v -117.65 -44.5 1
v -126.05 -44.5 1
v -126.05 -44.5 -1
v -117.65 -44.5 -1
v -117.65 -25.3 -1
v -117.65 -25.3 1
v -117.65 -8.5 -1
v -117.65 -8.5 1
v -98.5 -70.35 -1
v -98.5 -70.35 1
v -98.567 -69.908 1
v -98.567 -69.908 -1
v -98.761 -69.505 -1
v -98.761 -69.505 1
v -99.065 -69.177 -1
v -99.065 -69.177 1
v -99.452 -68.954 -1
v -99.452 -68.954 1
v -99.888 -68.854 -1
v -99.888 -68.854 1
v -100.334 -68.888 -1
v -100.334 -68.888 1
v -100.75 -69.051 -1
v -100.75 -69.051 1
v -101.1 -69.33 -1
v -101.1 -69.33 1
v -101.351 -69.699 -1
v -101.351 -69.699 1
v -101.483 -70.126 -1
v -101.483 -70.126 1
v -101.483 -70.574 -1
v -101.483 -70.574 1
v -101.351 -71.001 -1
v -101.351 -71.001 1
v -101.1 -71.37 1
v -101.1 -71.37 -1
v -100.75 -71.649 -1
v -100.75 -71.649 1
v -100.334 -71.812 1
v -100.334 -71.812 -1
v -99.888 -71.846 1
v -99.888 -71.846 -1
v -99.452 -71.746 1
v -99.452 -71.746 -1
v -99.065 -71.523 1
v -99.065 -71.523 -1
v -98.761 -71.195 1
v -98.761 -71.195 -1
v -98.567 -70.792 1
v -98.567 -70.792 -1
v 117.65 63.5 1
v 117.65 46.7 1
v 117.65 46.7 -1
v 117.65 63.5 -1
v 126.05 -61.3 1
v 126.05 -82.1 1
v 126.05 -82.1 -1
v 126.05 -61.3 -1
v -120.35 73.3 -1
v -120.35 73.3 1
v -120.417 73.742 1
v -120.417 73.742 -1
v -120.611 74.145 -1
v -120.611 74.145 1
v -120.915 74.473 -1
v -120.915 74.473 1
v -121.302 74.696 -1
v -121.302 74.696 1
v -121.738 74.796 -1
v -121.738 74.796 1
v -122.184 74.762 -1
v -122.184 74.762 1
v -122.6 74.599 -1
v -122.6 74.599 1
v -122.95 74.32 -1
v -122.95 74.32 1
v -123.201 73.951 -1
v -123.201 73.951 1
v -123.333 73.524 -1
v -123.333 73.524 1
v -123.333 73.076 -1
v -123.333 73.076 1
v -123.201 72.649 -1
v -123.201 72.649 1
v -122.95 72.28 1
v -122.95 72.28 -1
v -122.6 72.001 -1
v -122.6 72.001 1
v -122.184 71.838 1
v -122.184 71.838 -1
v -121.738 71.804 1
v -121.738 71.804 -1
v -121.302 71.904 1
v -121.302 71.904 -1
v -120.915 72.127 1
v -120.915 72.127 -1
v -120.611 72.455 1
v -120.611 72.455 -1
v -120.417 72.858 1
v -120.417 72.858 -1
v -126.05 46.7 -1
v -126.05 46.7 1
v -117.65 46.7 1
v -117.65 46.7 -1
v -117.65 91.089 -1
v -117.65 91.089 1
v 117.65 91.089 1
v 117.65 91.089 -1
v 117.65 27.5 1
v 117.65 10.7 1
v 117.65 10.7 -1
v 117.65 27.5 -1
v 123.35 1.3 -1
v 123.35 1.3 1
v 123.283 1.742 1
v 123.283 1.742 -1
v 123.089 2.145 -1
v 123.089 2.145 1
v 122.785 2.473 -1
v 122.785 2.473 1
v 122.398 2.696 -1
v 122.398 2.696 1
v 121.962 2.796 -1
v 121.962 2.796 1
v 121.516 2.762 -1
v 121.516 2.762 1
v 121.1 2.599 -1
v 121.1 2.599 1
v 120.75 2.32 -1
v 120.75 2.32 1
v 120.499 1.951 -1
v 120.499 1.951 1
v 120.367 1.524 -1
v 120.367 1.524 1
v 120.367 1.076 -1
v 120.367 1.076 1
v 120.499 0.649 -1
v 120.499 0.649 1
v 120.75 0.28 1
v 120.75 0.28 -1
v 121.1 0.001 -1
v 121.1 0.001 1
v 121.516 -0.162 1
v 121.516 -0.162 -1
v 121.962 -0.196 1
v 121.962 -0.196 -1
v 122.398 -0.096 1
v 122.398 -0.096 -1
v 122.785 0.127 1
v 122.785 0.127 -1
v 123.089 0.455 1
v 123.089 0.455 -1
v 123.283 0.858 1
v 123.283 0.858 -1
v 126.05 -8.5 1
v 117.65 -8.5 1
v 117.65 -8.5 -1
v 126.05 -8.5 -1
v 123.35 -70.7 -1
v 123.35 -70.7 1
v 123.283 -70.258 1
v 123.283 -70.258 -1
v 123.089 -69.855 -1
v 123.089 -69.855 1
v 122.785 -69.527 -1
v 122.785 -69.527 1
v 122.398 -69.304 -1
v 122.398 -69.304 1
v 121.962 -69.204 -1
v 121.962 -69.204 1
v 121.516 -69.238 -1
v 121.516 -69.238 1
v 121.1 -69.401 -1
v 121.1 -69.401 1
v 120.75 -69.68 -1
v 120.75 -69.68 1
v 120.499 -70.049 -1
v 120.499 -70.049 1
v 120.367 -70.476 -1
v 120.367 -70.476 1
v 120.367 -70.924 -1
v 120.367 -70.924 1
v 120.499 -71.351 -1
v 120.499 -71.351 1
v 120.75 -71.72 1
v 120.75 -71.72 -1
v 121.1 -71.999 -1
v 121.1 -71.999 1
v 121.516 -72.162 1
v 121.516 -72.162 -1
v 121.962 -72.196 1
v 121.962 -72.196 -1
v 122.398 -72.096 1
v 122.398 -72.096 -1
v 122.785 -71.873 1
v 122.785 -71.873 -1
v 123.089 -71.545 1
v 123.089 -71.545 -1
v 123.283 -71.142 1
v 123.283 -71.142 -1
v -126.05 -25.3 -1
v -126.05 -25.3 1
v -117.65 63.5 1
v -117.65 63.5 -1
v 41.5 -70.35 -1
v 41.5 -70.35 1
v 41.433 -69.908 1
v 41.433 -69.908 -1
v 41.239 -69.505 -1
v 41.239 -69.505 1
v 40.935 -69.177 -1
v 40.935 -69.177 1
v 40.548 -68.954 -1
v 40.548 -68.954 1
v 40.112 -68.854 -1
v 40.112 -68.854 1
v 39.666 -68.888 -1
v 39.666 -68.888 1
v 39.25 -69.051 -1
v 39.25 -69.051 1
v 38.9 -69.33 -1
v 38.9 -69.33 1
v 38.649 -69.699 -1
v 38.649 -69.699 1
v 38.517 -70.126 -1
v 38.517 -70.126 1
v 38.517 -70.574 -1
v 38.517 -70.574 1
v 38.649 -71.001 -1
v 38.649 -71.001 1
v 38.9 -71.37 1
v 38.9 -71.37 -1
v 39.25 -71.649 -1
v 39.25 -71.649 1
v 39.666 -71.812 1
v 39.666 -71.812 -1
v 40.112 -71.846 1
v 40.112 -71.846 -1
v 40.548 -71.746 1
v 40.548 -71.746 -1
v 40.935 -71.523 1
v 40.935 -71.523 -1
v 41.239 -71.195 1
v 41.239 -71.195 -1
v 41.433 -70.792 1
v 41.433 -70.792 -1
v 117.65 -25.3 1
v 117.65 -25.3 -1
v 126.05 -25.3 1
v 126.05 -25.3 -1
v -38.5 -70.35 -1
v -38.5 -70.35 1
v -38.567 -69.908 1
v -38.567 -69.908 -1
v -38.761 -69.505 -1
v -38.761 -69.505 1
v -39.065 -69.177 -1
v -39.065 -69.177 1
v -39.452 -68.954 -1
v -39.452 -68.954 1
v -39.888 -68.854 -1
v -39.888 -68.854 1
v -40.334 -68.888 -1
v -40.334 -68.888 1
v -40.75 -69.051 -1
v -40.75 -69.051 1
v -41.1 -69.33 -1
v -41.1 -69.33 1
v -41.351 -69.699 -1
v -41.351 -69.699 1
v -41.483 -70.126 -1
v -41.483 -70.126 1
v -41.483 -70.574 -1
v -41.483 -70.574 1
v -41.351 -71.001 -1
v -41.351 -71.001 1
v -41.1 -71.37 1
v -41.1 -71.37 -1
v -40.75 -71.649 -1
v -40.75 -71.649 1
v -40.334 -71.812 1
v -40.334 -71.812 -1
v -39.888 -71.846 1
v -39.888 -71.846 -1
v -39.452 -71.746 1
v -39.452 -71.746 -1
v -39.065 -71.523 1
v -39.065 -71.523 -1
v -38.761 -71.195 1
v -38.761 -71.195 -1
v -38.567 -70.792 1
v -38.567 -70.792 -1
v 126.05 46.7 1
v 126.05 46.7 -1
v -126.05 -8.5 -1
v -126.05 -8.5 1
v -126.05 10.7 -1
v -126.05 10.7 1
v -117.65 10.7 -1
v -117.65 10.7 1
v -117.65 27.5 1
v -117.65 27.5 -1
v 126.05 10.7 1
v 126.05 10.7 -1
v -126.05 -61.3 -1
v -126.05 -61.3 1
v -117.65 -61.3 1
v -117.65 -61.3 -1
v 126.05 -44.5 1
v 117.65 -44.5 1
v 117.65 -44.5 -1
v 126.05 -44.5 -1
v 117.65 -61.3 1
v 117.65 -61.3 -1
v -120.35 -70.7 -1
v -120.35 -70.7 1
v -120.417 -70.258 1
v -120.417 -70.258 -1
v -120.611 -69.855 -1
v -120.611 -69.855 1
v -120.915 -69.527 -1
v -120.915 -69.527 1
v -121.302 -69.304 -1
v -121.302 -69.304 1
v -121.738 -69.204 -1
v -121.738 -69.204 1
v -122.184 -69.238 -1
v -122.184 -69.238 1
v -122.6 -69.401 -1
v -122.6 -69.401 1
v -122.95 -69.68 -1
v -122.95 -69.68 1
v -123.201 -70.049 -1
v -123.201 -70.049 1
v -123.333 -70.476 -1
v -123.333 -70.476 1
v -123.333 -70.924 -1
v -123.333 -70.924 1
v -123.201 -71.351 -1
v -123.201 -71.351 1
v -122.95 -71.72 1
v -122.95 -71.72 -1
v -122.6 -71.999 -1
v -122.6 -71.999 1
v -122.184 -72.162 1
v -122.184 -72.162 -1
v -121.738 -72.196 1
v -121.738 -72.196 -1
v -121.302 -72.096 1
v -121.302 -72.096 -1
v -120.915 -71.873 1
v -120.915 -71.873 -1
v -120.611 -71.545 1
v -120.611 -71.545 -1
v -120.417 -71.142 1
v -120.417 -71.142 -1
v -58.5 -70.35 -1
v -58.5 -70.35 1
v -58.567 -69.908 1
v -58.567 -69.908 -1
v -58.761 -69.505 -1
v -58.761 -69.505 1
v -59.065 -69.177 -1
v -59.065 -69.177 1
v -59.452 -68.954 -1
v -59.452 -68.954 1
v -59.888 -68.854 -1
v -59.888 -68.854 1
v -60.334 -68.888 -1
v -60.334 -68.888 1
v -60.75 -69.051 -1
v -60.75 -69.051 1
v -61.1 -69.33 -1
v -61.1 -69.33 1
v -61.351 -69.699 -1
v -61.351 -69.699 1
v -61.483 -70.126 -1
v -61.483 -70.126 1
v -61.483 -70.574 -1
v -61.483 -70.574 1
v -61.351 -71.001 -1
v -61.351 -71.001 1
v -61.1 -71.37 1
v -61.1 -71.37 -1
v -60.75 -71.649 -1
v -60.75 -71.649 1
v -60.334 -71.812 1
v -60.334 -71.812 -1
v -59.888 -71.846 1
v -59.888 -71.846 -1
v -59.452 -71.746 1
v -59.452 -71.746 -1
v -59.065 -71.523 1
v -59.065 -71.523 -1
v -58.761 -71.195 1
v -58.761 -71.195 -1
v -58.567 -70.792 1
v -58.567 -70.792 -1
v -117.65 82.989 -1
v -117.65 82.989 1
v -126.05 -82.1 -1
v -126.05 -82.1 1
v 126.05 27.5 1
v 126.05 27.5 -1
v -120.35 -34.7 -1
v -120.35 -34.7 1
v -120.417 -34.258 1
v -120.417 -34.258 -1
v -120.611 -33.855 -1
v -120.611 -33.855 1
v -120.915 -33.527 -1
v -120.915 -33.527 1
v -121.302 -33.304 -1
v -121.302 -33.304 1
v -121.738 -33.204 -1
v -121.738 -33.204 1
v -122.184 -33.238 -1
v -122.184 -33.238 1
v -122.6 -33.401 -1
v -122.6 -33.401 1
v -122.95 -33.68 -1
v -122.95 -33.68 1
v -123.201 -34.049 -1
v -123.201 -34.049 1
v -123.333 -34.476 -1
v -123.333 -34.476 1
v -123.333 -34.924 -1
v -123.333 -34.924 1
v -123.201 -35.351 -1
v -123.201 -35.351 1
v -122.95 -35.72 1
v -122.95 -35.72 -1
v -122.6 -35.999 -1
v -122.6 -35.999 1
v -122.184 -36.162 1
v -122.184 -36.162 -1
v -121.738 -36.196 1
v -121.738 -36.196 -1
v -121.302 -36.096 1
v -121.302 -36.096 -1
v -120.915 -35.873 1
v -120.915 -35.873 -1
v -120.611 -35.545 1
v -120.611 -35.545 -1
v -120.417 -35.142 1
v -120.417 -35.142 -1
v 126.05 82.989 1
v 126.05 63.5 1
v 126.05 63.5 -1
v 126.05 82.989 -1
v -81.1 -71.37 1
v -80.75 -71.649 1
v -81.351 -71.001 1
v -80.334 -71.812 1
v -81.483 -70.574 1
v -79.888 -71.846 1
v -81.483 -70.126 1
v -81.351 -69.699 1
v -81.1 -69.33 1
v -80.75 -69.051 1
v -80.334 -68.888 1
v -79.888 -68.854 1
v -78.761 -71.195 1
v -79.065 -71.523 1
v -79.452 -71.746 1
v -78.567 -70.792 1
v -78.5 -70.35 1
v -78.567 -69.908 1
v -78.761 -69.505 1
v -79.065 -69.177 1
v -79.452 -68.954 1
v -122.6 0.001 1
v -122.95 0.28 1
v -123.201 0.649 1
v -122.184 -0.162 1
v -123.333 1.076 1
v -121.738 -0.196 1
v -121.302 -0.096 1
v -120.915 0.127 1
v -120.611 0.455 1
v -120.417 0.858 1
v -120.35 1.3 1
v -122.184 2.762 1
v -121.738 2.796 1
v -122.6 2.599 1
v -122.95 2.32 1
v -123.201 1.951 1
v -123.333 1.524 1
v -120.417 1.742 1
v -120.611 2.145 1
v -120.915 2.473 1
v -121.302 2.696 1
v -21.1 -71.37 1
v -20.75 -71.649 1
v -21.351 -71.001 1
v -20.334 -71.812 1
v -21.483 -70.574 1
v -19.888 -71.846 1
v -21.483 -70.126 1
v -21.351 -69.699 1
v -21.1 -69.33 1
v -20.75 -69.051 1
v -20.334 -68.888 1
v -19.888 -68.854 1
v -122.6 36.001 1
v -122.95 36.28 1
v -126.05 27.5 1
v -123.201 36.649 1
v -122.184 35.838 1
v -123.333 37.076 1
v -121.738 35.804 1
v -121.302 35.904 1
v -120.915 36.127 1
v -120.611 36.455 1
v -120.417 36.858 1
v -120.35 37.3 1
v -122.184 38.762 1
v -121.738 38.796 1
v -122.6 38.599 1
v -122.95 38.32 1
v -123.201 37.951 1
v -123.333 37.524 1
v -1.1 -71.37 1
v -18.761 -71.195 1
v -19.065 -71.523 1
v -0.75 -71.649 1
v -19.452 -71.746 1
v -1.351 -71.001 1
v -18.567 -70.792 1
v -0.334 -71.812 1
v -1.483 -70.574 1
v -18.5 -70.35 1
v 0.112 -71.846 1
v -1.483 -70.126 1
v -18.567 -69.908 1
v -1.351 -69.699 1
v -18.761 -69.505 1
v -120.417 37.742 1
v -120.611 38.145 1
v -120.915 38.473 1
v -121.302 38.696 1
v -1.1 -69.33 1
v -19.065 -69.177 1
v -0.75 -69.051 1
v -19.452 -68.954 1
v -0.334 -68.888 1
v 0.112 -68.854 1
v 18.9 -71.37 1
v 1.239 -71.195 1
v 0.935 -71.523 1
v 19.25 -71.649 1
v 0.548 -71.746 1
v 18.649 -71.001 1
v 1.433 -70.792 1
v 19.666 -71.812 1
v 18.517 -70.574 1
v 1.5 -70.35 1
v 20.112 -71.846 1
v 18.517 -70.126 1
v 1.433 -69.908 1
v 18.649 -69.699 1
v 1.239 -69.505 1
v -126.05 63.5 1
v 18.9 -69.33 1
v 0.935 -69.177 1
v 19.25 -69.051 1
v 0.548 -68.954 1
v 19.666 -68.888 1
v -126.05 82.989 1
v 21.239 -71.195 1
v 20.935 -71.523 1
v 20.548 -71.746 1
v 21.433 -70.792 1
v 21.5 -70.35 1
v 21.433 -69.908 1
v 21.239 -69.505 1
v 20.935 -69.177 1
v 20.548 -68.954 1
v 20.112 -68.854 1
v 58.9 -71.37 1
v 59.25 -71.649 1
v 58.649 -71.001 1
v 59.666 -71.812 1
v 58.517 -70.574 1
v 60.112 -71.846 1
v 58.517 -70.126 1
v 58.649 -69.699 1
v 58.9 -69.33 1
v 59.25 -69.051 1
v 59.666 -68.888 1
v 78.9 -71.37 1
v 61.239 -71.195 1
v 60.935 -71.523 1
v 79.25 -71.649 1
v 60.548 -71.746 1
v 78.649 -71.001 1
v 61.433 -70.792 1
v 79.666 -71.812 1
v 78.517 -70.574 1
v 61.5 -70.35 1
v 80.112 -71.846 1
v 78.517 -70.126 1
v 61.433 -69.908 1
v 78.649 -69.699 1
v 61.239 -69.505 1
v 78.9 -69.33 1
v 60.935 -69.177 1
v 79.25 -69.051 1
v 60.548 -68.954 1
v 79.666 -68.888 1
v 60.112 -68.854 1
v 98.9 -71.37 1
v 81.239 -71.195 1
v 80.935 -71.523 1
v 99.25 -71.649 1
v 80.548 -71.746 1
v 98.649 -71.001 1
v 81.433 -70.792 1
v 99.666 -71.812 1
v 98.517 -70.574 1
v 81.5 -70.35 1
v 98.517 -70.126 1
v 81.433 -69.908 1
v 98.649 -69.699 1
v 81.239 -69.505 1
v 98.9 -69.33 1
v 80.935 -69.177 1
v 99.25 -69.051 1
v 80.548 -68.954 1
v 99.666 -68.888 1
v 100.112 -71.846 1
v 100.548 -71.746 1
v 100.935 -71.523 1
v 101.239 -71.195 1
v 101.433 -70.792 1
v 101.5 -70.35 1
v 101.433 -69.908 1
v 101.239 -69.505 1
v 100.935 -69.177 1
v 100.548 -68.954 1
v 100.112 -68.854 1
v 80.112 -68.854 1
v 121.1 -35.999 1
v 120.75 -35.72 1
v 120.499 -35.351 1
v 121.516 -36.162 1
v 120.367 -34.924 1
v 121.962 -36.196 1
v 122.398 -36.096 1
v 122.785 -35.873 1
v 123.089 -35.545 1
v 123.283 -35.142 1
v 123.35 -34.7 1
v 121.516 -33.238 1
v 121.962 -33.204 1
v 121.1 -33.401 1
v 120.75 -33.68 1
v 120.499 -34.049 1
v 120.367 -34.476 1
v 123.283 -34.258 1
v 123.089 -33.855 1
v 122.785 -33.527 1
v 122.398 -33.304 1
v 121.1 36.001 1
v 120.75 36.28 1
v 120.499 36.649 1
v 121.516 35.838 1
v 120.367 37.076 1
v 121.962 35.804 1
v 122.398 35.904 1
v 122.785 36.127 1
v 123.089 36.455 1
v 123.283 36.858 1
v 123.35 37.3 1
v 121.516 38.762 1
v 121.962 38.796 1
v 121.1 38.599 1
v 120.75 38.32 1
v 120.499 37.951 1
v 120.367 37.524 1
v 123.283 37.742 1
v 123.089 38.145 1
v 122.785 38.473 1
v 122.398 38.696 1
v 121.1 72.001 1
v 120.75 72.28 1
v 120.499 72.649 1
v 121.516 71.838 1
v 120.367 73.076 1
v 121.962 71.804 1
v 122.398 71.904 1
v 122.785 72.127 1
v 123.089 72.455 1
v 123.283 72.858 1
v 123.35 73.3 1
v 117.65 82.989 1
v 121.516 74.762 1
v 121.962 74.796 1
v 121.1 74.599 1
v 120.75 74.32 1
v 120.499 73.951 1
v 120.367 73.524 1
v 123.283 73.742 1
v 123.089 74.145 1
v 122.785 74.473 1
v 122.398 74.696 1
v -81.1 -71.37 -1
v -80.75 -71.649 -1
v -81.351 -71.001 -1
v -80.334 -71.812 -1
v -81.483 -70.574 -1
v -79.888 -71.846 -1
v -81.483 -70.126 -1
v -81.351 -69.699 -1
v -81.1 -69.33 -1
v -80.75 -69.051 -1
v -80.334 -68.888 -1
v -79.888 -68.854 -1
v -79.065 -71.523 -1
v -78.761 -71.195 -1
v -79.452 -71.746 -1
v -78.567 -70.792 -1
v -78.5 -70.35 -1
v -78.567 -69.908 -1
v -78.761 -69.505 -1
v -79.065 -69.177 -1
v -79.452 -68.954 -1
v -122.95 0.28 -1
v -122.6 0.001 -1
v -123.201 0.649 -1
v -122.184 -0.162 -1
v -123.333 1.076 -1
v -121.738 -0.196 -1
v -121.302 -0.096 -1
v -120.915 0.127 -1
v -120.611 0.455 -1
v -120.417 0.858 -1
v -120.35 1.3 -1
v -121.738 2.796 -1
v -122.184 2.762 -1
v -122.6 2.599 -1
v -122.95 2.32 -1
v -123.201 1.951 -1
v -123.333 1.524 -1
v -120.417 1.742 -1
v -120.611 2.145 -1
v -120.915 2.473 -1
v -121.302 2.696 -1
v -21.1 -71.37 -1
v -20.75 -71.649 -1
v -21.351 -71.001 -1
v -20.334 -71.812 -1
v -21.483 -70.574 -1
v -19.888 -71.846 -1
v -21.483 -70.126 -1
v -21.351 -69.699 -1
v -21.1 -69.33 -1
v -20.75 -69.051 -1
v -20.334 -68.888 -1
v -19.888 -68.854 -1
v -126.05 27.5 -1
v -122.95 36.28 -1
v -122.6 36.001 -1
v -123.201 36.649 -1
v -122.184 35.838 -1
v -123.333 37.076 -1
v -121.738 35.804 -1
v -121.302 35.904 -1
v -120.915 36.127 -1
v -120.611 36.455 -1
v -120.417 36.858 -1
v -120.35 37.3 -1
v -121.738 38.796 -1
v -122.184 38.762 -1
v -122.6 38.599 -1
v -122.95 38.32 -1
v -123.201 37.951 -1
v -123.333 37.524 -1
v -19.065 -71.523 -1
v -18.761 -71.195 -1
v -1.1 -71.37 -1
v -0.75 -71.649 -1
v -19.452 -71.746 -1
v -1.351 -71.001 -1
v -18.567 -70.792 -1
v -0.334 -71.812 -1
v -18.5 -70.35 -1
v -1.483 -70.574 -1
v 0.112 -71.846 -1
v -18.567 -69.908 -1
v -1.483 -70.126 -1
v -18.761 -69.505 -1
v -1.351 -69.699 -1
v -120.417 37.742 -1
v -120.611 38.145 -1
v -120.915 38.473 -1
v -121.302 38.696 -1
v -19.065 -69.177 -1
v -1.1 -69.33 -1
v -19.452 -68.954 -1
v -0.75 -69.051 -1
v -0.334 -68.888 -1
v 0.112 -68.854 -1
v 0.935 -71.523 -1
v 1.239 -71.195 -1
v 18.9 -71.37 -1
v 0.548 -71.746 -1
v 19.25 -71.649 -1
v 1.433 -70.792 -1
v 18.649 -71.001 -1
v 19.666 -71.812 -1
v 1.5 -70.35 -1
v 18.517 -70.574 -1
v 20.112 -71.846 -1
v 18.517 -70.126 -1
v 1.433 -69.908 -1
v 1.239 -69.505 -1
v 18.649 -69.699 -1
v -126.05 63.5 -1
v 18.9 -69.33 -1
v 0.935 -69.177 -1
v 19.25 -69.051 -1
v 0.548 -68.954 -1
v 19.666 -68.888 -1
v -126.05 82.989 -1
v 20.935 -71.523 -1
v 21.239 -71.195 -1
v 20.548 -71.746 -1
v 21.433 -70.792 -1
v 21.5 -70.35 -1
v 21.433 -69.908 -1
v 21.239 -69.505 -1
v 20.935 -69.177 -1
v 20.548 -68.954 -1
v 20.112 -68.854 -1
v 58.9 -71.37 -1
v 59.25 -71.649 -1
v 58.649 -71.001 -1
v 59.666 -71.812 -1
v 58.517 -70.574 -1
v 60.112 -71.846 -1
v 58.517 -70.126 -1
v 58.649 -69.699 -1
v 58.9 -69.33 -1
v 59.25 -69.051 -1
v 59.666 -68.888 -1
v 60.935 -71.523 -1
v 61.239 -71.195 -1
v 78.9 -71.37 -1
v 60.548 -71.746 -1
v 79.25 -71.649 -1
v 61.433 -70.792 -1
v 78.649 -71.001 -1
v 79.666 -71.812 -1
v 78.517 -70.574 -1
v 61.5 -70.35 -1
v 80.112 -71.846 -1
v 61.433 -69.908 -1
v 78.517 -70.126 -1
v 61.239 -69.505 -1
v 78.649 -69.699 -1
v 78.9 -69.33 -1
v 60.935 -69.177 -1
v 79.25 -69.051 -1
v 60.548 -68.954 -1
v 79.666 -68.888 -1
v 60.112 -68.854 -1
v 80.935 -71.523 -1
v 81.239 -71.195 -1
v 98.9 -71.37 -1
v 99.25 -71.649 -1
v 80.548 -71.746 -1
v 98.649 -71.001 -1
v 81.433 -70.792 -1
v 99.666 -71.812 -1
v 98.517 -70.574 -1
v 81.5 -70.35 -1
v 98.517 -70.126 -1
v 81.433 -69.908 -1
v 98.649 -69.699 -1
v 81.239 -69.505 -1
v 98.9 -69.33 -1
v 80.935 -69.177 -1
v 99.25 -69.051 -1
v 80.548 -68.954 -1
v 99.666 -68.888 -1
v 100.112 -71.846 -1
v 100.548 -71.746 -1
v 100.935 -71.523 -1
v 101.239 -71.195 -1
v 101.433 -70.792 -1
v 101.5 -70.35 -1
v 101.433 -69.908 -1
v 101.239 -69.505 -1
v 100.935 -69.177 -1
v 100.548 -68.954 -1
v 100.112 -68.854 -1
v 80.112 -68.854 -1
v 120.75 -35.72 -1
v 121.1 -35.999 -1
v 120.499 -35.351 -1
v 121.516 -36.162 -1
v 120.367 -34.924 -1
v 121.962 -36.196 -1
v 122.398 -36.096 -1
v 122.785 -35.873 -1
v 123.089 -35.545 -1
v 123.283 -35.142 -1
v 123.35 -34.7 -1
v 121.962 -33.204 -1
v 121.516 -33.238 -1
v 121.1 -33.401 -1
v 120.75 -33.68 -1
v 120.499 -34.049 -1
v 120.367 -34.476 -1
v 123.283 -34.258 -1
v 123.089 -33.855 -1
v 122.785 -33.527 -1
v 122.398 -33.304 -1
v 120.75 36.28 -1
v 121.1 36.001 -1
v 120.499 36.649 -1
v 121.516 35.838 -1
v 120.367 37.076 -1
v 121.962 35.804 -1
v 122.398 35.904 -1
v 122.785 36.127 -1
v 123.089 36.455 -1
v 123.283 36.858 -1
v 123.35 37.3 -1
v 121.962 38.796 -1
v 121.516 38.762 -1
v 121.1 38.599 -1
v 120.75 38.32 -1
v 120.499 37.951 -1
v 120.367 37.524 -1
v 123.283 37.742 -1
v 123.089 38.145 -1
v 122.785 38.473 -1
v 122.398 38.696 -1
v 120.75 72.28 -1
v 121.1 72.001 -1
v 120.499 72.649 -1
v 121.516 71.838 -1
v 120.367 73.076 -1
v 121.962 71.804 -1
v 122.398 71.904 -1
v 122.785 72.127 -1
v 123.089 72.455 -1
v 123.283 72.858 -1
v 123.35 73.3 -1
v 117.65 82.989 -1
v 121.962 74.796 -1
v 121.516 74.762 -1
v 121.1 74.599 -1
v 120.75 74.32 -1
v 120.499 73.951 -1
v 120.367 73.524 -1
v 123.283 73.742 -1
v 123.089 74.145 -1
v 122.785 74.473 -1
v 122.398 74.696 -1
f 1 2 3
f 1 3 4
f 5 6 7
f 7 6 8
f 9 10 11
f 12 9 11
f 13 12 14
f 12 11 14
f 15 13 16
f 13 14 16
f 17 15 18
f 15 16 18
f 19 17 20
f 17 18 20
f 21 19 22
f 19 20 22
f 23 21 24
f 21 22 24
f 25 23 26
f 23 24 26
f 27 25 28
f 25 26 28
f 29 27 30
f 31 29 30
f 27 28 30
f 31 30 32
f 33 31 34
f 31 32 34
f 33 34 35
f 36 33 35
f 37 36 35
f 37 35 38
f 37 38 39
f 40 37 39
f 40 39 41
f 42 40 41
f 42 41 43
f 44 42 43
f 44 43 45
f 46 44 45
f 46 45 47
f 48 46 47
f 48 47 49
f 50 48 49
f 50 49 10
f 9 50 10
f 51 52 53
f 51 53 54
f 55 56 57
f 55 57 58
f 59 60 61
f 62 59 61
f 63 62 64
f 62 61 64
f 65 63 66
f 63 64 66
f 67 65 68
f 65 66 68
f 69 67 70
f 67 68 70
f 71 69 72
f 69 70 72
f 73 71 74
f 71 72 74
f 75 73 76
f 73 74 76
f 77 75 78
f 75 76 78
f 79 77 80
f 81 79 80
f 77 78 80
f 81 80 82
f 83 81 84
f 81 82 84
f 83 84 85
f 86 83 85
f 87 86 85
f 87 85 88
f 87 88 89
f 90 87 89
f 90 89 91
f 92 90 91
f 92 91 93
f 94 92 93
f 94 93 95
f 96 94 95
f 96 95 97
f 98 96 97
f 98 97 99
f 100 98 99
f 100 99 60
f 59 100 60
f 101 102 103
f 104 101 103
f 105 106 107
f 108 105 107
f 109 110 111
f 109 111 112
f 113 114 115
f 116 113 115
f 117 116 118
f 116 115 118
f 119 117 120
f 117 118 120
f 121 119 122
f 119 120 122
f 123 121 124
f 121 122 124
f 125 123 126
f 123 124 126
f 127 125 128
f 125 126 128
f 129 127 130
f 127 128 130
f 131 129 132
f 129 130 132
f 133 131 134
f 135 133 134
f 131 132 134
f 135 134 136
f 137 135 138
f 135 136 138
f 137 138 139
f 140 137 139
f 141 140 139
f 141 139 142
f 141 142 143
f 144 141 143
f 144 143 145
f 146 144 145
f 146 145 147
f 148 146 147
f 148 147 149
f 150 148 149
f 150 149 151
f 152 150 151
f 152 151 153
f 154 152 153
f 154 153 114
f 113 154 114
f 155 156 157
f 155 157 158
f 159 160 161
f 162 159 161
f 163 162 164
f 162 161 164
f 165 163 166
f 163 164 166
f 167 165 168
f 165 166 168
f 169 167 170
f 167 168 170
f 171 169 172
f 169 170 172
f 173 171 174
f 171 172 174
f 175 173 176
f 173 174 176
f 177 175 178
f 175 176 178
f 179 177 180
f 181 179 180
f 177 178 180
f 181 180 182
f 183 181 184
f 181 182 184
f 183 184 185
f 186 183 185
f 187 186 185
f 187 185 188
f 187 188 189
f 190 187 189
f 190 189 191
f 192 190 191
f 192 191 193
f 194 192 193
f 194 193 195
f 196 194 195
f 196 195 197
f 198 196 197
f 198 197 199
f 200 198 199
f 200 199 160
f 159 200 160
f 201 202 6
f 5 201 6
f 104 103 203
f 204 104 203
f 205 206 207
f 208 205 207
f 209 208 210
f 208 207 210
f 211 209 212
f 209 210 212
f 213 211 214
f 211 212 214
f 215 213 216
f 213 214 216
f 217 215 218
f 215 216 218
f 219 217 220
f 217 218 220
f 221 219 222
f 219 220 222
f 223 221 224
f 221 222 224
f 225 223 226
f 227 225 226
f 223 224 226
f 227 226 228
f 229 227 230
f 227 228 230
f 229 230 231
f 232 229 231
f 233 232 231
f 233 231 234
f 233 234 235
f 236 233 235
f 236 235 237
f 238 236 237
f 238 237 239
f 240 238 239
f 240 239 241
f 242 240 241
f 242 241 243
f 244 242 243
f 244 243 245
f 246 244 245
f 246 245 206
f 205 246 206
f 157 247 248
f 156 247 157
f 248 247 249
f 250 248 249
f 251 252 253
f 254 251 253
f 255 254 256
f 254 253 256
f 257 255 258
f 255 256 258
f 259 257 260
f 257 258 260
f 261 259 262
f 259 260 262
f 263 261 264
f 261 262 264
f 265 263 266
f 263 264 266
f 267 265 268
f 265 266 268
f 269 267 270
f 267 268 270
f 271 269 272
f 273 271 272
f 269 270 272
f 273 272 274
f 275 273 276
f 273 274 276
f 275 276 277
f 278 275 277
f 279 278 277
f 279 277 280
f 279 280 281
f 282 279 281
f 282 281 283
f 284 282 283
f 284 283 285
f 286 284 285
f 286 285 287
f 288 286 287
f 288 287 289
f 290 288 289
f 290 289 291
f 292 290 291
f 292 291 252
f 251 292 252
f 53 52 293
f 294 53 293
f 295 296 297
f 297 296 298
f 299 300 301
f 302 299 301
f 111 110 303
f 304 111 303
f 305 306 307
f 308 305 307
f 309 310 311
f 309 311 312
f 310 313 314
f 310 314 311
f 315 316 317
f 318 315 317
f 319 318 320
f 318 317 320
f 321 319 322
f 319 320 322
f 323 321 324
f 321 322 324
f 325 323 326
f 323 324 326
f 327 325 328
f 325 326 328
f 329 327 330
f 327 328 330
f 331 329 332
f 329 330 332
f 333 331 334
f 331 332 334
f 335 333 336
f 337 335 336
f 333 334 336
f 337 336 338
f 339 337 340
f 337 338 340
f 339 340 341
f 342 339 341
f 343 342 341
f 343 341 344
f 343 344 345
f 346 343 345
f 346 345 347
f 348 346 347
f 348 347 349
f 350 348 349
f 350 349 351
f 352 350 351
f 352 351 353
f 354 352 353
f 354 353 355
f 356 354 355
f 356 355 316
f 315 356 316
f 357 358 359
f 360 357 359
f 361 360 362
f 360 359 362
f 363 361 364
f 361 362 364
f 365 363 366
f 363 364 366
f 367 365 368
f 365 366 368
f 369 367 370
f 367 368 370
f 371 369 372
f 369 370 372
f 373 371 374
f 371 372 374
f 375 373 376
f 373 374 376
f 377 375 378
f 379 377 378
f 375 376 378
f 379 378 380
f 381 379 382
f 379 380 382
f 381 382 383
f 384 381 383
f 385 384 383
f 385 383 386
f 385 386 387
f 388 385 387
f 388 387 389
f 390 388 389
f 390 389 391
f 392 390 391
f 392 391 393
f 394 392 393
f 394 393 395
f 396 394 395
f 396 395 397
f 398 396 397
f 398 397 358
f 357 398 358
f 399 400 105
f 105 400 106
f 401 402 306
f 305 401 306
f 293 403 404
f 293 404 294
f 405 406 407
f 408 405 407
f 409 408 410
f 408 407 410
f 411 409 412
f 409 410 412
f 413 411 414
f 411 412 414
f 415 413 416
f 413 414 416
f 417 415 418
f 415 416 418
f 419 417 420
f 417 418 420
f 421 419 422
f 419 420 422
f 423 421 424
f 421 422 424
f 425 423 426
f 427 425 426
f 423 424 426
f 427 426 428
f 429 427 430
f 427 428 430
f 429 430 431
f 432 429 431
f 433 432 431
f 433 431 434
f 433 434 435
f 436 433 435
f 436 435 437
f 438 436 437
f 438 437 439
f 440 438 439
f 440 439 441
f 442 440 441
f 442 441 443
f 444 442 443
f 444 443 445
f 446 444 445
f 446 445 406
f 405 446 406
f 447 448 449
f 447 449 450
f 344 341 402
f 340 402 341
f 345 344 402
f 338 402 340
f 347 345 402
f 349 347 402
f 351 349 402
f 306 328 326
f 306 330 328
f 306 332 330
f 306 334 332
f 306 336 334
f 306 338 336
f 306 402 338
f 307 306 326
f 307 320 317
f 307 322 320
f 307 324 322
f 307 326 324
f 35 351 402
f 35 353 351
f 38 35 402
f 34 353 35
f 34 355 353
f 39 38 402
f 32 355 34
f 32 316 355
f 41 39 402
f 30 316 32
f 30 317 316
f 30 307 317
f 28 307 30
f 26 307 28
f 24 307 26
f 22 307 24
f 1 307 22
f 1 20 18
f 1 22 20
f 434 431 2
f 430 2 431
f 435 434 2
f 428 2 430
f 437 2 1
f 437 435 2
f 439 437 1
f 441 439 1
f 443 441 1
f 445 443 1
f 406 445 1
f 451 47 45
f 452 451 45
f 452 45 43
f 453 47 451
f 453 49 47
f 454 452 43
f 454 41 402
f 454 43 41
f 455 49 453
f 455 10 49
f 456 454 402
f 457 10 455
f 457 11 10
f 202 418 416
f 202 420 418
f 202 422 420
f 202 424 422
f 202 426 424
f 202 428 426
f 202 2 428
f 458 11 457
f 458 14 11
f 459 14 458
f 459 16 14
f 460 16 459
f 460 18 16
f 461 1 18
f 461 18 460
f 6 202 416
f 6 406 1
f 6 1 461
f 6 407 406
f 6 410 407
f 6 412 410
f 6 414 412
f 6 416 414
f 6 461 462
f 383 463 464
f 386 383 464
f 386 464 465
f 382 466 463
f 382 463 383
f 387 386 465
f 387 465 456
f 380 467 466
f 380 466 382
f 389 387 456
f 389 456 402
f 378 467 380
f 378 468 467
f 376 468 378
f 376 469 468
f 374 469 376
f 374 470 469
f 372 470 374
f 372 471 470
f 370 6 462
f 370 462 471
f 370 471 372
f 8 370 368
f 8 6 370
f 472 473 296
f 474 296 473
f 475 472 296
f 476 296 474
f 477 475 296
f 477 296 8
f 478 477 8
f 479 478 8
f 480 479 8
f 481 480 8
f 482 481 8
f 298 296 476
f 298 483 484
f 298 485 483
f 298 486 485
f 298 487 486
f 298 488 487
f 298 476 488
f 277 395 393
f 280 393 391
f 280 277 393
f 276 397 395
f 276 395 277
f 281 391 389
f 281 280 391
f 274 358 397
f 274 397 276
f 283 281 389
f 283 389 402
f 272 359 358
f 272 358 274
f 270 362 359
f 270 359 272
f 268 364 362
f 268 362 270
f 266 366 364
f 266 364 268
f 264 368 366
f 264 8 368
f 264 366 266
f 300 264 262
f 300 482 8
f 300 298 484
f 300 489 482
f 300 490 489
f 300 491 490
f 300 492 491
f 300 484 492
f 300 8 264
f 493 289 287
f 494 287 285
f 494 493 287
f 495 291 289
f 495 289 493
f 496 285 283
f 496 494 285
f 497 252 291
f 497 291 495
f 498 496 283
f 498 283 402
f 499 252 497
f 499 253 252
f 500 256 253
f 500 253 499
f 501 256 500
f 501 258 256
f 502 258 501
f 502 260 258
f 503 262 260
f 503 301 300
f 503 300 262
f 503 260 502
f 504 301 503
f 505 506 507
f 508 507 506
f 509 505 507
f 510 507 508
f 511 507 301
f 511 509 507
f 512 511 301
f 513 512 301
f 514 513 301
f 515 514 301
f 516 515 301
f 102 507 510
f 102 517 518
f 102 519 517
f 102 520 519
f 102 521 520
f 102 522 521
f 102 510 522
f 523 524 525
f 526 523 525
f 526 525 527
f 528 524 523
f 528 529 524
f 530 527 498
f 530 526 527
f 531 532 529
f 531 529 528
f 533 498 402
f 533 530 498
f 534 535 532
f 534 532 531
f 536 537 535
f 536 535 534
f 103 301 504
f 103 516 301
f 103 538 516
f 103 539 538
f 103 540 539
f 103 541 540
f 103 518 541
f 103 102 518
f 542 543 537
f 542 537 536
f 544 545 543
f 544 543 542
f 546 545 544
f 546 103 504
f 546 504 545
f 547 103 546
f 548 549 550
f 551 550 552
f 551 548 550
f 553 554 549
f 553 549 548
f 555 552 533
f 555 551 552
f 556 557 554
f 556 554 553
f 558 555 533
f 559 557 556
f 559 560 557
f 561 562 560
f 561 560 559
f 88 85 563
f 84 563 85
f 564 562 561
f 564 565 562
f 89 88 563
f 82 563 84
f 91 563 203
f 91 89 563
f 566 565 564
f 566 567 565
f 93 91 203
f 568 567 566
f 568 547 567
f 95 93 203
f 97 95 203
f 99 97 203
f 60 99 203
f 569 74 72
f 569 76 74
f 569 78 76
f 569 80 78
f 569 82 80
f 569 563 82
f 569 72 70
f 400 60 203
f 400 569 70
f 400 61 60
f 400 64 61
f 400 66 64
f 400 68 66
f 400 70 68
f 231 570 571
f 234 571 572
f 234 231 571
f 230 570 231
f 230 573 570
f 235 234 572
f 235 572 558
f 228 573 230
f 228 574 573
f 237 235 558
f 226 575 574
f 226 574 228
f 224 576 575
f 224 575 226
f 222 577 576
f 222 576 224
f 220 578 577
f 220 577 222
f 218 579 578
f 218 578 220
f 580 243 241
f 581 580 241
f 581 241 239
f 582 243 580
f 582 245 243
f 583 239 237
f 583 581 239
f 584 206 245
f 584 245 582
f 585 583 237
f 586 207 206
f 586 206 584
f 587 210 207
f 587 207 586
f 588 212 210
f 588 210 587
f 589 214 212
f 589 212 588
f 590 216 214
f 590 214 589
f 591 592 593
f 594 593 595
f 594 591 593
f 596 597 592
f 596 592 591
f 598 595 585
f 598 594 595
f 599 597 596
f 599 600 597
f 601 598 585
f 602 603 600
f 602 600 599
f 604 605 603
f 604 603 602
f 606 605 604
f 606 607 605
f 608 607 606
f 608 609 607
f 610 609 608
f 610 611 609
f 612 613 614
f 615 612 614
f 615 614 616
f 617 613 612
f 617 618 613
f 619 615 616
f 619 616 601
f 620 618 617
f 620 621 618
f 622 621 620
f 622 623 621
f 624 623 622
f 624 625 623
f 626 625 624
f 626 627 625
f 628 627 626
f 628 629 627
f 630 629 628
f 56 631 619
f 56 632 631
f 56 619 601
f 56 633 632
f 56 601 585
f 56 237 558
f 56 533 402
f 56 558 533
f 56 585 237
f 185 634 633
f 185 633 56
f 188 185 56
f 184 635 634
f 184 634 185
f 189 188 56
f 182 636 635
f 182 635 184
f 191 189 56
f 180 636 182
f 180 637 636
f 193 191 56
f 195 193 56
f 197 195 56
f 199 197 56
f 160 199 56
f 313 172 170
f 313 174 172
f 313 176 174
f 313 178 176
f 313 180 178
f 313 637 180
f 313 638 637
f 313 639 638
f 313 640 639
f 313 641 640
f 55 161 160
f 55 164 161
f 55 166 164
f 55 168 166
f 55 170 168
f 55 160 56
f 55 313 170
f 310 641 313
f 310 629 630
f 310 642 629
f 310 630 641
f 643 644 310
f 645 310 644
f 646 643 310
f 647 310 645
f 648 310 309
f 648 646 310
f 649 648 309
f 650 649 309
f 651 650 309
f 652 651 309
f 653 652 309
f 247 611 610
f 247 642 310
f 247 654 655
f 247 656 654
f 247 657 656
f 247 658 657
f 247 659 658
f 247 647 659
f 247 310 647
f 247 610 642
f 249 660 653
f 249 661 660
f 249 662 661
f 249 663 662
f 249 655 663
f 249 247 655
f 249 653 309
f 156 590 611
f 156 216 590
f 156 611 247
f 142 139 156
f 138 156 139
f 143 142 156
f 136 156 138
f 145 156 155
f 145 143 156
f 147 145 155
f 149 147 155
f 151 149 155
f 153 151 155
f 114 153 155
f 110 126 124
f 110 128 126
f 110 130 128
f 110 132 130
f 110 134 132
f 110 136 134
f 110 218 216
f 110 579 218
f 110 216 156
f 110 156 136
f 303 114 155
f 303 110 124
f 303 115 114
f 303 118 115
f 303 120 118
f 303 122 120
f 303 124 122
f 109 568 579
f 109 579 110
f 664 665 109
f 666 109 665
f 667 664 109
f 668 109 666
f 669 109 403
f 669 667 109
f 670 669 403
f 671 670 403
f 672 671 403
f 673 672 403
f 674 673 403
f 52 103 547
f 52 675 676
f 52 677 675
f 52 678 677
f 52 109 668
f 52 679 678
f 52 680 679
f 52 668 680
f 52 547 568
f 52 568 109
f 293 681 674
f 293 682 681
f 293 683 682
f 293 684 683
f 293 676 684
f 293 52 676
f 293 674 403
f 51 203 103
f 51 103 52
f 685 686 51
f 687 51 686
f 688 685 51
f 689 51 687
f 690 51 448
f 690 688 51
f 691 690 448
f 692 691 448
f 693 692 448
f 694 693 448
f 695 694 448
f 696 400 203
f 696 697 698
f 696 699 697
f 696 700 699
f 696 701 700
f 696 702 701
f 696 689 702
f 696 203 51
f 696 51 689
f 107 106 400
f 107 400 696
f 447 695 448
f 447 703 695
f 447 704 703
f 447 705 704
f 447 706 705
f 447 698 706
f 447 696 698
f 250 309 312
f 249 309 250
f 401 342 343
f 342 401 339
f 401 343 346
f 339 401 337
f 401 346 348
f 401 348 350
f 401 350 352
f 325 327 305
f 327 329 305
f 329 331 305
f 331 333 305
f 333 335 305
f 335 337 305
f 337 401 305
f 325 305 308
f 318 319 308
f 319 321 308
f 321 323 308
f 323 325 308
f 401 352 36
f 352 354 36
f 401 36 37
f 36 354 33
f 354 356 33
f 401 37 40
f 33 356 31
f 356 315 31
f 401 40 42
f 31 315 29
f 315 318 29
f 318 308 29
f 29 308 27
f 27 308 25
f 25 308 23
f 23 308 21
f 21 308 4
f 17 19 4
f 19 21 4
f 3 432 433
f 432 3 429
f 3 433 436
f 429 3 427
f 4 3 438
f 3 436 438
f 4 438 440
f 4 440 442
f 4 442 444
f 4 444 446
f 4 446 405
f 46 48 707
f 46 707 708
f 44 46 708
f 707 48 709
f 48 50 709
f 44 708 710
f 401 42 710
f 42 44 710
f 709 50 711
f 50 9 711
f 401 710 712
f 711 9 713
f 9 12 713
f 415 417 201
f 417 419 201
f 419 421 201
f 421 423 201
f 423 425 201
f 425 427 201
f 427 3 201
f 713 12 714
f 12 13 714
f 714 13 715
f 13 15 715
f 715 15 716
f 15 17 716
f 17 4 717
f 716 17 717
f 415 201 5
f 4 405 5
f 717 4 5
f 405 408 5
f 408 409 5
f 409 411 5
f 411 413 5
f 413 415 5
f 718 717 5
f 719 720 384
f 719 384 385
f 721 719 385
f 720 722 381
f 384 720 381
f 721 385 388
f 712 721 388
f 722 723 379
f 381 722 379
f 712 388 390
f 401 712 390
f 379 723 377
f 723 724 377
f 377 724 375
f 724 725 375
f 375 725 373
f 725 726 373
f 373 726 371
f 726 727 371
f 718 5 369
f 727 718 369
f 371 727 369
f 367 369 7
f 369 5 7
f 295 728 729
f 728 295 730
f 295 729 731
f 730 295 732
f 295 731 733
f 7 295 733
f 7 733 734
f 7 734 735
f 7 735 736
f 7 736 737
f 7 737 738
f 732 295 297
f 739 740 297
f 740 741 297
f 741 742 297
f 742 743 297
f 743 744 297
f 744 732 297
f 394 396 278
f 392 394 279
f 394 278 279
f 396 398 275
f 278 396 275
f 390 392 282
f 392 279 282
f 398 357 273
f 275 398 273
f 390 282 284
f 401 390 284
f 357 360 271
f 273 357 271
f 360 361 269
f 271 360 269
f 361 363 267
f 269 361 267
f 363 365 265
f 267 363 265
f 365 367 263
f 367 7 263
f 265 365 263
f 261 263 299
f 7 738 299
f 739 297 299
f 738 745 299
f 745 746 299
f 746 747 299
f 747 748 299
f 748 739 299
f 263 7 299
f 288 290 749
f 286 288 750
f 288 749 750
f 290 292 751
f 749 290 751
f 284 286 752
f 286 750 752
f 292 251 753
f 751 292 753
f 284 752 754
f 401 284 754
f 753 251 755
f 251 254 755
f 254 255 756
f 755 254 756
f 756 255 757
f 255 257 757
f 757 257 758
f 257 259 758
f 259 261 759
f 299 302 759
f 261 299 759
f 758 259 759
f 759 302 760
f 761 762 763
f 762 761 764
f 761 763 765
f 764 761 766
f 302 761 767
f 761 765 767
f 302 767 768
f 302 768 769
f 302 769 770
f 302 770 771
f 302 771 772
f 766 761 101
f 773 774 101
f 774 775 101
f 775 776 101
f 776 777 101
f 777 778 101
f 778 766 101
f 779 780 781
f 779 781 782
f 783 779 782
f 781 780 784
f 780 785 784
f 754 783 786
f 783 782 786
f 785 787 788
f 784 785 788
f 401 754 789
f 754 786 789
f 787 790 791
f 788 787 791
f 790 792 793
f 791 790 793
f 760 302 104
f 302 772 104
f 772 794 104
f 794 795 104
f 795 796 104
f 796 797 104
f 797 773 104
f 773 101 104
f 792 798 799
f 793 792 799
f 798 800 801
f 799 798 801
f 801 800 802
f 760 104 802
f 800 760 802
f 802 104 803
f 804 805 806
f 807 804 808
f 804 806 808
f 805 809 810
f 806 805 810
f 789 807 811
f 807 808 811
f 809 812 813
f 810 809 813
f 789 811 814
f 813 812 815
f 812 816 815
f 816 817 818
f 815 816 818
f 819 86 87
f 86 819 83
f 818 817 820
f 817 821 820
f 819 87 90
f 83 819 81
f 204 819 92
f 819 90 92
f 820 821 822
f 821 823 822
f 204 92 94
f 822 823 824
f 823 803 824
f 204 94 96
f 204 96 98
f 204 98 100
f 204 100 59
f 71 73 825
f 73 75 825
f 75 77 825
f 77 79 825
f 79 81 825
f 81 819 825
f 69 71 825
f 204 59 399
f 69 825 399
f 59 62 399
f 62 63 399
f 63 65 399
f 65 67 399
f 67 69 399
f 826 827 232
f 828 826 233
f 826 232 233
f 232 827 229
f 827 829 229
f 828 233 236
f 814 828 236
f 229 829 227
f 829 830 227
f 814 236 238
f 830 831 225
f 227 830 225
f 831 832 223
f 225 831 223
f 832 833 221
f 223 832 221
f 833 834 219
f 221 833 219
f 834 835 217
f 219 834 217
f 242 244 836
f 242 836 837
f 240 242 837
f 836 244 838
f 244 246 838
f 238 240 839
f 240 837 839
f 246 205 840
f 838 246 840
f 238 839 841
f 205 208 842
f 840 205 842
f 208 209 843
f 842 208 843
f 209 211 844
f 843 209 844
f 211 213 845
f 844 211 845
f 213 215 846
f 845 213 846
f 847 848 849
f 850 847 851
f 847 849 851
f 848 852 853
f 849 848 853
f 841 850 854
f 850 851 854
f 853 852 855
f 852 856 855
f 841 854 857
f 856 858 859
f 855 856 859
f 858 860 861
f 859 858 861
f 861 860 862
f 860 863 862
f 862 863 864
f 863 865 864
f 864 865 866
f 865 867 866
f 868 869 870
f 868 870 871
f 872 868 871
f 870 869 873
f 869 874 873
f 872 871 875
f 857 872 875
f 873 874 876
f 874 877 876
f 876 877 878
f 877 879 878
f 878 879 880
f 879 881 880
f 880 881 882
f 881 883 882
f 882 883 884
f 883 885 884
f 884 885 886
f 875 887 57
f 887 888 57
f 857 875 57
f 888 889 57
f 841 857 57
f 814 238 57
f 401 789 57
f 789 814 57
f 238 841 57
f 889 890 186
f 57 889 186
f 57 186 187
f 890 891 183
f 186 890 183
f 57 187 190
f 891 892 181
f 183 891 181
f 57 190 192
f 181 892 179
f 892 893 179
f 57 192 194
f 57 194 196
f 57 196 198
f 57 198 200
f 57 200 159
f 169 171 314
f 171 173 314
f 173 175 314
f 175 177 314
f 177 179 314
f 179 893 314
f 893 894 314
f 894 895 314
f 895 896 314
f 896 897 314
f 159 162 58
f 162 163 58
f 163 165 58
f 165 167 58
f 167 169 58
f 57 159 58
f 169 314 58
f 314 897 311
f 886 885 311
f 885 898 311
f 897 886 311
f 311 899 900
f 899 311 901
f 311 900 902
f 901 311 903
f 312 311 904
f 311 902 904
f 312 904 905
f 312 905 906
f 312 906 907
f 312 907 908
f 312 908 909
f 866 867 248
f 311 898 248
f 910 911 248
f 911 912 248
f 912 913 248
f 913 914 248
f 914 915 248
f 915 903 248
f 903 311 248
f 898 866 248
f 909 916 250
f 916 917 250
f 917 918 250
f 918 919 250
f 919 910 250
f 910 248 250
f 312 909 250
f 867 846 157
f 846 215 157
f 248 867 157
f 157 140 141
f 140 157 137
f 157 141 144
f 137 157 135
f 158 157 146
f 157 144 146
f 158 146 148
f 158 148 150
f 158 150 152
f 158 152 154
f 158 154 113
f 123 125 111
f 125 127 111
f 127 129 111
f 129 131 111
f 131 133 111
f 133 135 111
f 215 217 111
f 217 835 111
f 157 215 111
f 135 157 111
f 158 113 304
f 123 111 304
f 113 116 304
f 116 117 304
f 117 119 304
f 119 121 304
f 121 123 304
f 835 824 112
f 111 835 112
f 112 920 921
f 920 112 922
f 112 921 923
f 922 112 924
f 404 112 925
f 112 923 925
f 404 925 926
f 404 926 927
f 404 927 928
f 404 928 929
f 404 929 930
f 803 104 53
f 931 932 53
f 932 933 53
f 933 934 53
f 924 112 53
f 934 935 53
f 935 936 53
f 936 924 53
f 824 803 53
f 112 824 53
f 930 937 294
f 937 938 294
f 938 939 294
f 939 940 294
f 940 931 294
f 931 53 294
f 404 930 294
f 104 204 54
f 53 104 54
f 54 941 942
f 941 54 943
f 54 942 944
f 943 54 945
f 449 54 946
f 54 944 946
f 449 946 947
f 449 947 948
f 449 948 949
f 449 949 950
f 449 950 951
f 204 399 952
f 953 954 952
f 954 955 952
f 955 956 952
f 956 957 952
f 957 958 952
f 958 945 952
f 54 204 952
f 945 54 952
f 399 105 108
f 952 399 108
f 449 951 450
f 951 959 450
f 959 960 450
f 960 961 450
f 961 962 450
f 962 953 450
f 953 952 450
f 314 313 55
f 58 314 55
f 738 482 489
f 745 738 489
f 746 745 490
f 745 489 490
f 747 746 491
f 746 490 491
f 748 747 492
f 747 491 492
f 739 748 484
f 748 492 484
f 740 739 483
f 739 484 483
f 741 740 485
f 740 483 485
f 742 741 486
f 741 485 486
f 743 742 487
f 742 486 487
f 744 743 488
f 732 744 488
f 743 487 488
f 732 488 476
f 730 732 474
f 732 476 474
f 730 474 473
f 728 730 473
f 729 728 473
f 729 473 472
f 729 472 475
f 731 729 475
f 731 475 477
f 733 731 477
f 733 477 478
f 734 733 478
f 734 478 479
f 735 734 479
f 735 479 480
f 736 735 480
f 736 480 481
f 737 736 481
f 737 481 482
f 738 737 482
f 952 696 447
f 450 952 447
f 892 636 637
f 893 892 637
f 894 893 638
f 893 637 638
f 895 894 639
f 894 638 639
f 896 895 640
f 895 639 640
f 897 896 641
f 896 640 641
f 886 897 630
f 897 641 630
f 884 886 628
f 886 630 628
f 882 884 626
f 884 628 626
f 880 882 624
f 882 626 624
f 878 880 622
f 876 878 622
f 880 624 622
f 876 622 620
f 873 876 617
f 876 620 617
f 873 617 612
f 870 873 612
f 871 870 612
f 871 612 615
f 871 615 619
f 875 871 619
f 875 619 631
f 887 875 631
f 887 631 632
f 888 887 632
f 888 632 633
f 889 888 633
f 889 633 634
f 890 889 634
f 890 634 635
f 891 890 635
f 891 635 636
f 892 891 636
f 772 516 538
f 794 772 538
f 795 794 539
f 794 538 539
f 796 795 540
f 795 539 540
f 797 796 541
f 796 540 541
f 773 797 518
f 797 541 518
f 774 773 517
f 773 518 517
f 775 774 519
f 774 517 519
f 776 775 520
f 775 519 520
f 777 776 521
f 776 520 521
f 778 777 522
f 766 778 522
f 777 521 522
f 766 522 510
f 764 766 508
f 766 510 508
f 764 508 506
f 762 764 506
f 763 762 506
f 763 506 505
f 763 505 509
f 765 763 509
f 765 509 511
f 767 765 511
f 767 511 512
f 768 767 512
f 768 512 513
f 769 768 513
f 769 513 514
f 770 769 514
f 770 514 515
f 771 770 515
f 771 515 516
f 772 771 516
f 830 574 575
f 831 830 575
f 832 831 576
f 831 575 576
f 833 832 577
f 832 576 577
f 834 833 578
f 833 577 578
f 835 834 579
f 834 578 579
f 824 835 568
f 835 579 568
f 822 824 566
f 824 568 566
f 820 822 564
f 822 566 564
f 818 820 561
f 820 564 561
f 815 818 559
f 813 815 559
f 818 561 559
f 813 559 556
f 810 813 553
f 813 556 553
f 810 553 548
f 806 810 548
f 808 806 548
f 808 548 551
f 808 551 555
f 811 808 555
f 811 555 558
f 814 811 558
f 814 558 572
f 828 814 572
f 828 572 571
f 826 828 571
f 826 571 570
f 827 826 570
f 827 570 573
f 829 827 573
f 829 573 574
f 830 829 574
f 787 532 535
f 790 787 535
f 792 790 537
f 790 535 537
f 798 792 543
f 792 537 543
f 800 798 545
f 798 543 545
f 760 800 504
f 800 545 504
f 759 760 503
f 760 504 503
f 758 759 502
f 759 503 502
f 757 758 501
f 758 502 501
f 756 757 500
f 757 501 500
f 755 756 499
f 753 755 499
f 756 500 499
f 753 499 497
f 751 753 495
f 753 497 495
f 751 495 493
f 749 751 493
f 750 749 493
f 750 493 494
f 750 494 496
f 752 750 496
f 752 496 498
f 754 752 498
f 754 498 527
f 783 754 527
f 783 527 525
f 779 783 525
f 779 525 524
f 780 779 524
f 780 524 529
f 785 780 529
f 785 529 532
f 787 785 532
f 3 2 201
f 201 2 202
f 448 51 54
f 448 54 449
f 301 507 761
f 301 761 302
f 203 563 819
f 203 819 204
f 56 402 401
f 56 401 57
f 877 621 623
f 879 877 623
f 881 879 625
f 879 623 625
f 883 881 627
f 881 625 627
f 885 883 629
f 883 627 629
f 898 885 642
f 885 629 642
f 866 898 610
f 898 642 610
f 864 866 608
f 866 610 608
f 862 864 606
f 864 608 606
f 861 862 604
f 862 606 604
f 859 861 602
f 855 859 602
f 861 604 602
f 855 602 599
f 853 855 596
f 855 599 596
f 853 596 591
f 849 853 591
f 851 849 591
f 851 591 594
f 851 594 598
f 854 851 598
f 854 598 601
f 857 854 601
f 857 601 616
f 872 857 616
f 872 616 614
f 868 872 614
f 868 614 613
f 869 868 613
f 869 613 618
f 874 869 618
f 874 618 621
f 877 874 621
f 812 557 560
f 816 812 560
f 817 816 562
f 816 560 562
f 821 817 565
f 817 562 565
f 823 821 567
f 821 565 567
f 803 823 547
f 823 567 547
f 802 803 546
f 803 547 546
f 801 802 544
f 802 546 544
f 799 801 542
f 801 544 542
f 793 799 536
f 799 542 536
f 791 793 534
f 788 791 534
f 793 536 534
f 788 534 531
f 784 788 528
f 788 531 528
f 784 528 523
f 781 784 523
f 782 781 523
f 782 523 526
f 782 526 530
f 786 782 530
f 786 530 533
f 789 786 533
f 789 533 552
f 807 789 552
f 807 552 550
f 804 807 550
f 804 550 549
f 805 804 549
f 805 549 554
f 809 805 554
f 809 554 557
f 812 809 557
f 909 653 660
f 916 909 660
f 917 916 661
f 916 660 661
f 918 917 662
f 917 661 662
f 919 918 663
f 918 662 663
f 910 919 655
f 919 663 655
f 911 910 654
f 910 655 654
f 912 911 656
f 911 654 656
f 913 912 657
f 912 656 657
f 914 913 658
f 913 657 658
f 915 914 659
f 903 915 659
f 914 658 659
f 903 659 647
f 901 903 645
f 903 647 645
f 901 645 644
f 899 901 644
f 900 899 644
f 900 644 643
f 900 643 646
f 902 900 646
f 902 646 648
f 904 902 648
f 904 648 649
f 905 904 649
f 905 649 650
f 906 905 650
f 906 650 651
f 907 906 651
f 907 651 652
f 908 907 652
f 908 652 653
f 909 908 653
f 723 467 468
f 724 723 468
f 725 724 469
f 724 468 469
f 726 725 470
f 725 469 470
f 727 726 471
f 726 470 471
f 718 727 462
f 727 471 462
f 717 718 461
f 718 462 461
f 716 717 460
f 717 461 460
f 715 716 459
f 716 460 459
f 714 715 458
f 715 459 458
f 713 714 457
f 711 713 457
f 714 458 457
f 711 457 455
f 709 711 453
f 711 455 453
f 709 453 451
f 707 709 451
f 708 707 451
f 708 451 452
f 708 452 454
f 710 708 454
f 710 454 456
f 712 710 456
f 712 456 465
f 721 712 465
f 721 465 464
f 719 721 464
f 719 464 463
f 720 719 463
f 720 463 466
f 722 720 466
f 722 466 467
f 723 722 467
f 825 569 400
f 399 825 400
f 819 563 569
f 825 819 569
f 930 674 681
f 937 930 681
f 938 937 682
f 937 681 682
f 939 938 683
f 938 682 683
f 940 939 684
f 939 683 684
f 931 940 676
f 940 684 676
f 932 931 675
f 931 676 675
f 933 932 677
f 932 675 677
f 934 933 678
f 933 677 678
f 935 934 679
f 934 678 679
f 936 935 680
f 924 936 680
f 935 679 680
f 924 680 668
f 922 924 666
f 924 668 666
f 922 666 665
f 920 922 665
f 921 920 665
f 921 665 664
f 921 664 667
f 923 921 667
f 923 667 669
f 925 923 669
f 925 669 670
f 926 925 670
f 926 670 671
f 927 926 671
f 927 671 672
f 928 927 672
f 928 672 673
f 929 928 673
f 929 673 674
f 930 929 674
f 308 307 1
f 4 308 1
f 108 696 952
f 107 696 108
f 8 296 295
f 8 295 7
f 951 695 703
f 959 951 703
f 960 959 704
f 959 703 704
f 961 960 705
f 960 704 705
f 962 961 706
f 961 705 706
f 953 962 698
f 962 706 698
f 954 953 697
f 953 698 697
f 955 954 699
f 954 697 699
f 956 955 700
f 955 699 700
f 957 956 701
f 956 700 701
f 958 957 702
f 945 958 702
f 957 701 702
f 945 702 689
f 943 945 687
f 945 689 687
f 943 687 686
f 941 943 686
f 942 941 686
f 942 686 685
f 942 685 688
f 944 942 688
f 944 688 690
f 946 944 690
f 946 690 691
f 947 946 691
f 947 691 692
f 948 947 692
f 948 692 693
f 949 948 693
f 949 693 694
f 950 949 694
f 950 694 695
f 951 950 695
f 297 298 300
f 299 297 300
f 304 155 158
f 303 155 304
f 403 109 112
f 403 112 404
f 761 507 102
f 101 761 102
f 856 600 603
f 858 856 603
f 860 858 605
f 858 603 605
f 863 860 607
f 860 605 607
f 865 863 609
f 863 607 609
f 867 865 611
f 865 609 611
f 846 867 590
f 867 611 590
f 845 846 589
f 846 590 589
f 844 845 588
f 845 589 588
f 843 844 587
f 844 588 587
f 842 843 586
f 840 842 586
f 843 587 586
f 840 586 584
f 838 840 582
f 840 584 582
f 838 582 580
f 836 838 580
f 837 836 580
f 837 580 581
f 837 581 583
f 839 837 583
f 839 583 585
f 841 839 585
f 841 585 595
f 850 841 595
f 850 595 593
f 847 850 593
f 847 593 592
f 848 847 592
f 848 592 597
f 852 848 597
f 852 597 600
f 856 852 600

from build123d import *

# Parameters (mm, degrees)
SKETCH_1_W          = 252.1
SKETCH_1_H          = 166.2
EXTRUDE_1_DEPTH     = 1
SKETCH_2_R          = 1.5
SKETCH_2_W          = 8.4
SKETCH_2_H          = 16.8
SKETCH_2_W_2        = 252.1
SKETCH_2_H_2        = 0.2
SKETCH_2_H_3        = 1
CUT_EXTRUDE1_DEPTH  = 10
SKETCH1_R           = 1.5
CUT_EXTRUDE2_DEPTH  = 10
SKETCH2_W           = 235.3
SKETCH2_H           = 8.1
BOSS_EXTRUDE1_DEPTH = 2


with BuildPart() as part:
    # 草图1 → 凸台-拉伸1 (new, symmetric)
    with BuildSketch(Plane.XY):
        Rectangle(SKETCH_1_W, SKETCH_1_H)
    extrude(amount=EXTRUDE_1_DEPTH, both=True)

    # 草图2 → Cut-Extrude1 (cut)
    with BuildSketch(Plane.XY.offset(1)):
        with Locations((-121.85, 73.3)):
            Circle(SKETCH_2_R)
        with Locations((-121.85, 37.3)):
            Circle(SKETCH_2_R)
        with Locations((-121.85, 1.3)):
            Circle(SKETCH_2_R)
        with Locations((-121.85, -34.7)):
            Circle(SKETCH_2_R)
        with Locations((-121.85, -70.7)):
            Circle(SKETCH_2_R)
        with Locations((121.85, -70.7)):
            Circle(SKETCH_2_R)
        with Locations((121.85, -34.7)):
            Circle(SKETCH_2_R)
        with Locations((121.85, 1.3)):
            Circle(SKETCH_2_R)
        with Locations((121.85, 37.3)):
            Circle(SKETCH_2_R)
        with Locations((121.85, 73.3)):
            Circle(SKETCH_2_R)
        with Locations((-121.85, 55.1)):
            Rectangle(SKETCH_2_W, SKETCH_2_H)
        with Locations((-121.85, 19.1)):
            Rectangle(SKETCH_2_W, SKETCH_2_H)
        with Locations((-121.85, -16.9)):
            Rectangle(SKETCH_2_W, SKETCH_2_H)
        with Locations((-121.85, -52.9)):
            Rectangle(SKETCH_2_W, SKETCH_2_H)
        with Locations((121.85, -52.9)):
            Rectangle(SKETCH_2_W, SKETCH_2_H)
        with Locations((121.85, -16.9)):
            Rectangle(SKETCH_2_W, SKETCH_2_H)
        with Locations((121.85, 19.1)):
            Rectangle(SKETCH_2_W, SKETCH_2_H)
        with Locations((121.85, 55.1)):
            Rectangle(SKETCH_2_W, SKETCH_2_H)
        with Locations((0, 83.089141708)):
            Rectangle(SKETCH_2_W_2, SKETCH_2_H_2)
        with Locations((0, -82.6)):
            Rectangle(SKETCH_2_W_2, SKETCH_2_H_3)
    extrude(amount=-CUT_EXTRUDE1_DEPTH, mode=Mode.SUBTRACT)

    # Sketch1 → Cut-Extrude2 (cut)
    with BuildSketch(Plane.XY.offset(1)):
        with Locations((100, -70.35)):
            Circle(SKETCH1_R)
        with Locations((80, -70.35)):
            Circle(SKETCH1_R)
        with Locations((60, -70.35)):
            Circle(SKETCH1_R)
        with Locations((40, -70.35)):
            Circle(SKETCH1_R)
        with Locations((20, -70.35)):
            Circle(SKETCH1_R)
        with Locations((0, -70.35)):
            Circle(SKETCH1_R)
        with Locations((-20, -70.35)):
            Circle(SKETCH1_R)
        with Locations((-40, -70.35)):
            Circle(SKETCH1_R)
        with Locations((-60, -70.35)):
            Circle(SKETCH1_R)
        with Locations((-80, -70.35)):
            Circle(SKETCH1_R)
        with Locations((-100, -70.35)):
            Circle(SKETCH1_R)
    extrude(amount=-CUT_EXTRUDE2_DEPTH, mode=Mode.SUBTRACT)

    # Sketch2 → Boss-Extrude1 (add)
    with BuildSketch(Plane.XY.offset(1)):
        with Locations((0, 87.039141708)):
            Rectangle(SKETCH2_W, SKETCH2_H)
    extrude(amount=-BOSS_EXTRUDE1_DEPTH)


solid = part.part
